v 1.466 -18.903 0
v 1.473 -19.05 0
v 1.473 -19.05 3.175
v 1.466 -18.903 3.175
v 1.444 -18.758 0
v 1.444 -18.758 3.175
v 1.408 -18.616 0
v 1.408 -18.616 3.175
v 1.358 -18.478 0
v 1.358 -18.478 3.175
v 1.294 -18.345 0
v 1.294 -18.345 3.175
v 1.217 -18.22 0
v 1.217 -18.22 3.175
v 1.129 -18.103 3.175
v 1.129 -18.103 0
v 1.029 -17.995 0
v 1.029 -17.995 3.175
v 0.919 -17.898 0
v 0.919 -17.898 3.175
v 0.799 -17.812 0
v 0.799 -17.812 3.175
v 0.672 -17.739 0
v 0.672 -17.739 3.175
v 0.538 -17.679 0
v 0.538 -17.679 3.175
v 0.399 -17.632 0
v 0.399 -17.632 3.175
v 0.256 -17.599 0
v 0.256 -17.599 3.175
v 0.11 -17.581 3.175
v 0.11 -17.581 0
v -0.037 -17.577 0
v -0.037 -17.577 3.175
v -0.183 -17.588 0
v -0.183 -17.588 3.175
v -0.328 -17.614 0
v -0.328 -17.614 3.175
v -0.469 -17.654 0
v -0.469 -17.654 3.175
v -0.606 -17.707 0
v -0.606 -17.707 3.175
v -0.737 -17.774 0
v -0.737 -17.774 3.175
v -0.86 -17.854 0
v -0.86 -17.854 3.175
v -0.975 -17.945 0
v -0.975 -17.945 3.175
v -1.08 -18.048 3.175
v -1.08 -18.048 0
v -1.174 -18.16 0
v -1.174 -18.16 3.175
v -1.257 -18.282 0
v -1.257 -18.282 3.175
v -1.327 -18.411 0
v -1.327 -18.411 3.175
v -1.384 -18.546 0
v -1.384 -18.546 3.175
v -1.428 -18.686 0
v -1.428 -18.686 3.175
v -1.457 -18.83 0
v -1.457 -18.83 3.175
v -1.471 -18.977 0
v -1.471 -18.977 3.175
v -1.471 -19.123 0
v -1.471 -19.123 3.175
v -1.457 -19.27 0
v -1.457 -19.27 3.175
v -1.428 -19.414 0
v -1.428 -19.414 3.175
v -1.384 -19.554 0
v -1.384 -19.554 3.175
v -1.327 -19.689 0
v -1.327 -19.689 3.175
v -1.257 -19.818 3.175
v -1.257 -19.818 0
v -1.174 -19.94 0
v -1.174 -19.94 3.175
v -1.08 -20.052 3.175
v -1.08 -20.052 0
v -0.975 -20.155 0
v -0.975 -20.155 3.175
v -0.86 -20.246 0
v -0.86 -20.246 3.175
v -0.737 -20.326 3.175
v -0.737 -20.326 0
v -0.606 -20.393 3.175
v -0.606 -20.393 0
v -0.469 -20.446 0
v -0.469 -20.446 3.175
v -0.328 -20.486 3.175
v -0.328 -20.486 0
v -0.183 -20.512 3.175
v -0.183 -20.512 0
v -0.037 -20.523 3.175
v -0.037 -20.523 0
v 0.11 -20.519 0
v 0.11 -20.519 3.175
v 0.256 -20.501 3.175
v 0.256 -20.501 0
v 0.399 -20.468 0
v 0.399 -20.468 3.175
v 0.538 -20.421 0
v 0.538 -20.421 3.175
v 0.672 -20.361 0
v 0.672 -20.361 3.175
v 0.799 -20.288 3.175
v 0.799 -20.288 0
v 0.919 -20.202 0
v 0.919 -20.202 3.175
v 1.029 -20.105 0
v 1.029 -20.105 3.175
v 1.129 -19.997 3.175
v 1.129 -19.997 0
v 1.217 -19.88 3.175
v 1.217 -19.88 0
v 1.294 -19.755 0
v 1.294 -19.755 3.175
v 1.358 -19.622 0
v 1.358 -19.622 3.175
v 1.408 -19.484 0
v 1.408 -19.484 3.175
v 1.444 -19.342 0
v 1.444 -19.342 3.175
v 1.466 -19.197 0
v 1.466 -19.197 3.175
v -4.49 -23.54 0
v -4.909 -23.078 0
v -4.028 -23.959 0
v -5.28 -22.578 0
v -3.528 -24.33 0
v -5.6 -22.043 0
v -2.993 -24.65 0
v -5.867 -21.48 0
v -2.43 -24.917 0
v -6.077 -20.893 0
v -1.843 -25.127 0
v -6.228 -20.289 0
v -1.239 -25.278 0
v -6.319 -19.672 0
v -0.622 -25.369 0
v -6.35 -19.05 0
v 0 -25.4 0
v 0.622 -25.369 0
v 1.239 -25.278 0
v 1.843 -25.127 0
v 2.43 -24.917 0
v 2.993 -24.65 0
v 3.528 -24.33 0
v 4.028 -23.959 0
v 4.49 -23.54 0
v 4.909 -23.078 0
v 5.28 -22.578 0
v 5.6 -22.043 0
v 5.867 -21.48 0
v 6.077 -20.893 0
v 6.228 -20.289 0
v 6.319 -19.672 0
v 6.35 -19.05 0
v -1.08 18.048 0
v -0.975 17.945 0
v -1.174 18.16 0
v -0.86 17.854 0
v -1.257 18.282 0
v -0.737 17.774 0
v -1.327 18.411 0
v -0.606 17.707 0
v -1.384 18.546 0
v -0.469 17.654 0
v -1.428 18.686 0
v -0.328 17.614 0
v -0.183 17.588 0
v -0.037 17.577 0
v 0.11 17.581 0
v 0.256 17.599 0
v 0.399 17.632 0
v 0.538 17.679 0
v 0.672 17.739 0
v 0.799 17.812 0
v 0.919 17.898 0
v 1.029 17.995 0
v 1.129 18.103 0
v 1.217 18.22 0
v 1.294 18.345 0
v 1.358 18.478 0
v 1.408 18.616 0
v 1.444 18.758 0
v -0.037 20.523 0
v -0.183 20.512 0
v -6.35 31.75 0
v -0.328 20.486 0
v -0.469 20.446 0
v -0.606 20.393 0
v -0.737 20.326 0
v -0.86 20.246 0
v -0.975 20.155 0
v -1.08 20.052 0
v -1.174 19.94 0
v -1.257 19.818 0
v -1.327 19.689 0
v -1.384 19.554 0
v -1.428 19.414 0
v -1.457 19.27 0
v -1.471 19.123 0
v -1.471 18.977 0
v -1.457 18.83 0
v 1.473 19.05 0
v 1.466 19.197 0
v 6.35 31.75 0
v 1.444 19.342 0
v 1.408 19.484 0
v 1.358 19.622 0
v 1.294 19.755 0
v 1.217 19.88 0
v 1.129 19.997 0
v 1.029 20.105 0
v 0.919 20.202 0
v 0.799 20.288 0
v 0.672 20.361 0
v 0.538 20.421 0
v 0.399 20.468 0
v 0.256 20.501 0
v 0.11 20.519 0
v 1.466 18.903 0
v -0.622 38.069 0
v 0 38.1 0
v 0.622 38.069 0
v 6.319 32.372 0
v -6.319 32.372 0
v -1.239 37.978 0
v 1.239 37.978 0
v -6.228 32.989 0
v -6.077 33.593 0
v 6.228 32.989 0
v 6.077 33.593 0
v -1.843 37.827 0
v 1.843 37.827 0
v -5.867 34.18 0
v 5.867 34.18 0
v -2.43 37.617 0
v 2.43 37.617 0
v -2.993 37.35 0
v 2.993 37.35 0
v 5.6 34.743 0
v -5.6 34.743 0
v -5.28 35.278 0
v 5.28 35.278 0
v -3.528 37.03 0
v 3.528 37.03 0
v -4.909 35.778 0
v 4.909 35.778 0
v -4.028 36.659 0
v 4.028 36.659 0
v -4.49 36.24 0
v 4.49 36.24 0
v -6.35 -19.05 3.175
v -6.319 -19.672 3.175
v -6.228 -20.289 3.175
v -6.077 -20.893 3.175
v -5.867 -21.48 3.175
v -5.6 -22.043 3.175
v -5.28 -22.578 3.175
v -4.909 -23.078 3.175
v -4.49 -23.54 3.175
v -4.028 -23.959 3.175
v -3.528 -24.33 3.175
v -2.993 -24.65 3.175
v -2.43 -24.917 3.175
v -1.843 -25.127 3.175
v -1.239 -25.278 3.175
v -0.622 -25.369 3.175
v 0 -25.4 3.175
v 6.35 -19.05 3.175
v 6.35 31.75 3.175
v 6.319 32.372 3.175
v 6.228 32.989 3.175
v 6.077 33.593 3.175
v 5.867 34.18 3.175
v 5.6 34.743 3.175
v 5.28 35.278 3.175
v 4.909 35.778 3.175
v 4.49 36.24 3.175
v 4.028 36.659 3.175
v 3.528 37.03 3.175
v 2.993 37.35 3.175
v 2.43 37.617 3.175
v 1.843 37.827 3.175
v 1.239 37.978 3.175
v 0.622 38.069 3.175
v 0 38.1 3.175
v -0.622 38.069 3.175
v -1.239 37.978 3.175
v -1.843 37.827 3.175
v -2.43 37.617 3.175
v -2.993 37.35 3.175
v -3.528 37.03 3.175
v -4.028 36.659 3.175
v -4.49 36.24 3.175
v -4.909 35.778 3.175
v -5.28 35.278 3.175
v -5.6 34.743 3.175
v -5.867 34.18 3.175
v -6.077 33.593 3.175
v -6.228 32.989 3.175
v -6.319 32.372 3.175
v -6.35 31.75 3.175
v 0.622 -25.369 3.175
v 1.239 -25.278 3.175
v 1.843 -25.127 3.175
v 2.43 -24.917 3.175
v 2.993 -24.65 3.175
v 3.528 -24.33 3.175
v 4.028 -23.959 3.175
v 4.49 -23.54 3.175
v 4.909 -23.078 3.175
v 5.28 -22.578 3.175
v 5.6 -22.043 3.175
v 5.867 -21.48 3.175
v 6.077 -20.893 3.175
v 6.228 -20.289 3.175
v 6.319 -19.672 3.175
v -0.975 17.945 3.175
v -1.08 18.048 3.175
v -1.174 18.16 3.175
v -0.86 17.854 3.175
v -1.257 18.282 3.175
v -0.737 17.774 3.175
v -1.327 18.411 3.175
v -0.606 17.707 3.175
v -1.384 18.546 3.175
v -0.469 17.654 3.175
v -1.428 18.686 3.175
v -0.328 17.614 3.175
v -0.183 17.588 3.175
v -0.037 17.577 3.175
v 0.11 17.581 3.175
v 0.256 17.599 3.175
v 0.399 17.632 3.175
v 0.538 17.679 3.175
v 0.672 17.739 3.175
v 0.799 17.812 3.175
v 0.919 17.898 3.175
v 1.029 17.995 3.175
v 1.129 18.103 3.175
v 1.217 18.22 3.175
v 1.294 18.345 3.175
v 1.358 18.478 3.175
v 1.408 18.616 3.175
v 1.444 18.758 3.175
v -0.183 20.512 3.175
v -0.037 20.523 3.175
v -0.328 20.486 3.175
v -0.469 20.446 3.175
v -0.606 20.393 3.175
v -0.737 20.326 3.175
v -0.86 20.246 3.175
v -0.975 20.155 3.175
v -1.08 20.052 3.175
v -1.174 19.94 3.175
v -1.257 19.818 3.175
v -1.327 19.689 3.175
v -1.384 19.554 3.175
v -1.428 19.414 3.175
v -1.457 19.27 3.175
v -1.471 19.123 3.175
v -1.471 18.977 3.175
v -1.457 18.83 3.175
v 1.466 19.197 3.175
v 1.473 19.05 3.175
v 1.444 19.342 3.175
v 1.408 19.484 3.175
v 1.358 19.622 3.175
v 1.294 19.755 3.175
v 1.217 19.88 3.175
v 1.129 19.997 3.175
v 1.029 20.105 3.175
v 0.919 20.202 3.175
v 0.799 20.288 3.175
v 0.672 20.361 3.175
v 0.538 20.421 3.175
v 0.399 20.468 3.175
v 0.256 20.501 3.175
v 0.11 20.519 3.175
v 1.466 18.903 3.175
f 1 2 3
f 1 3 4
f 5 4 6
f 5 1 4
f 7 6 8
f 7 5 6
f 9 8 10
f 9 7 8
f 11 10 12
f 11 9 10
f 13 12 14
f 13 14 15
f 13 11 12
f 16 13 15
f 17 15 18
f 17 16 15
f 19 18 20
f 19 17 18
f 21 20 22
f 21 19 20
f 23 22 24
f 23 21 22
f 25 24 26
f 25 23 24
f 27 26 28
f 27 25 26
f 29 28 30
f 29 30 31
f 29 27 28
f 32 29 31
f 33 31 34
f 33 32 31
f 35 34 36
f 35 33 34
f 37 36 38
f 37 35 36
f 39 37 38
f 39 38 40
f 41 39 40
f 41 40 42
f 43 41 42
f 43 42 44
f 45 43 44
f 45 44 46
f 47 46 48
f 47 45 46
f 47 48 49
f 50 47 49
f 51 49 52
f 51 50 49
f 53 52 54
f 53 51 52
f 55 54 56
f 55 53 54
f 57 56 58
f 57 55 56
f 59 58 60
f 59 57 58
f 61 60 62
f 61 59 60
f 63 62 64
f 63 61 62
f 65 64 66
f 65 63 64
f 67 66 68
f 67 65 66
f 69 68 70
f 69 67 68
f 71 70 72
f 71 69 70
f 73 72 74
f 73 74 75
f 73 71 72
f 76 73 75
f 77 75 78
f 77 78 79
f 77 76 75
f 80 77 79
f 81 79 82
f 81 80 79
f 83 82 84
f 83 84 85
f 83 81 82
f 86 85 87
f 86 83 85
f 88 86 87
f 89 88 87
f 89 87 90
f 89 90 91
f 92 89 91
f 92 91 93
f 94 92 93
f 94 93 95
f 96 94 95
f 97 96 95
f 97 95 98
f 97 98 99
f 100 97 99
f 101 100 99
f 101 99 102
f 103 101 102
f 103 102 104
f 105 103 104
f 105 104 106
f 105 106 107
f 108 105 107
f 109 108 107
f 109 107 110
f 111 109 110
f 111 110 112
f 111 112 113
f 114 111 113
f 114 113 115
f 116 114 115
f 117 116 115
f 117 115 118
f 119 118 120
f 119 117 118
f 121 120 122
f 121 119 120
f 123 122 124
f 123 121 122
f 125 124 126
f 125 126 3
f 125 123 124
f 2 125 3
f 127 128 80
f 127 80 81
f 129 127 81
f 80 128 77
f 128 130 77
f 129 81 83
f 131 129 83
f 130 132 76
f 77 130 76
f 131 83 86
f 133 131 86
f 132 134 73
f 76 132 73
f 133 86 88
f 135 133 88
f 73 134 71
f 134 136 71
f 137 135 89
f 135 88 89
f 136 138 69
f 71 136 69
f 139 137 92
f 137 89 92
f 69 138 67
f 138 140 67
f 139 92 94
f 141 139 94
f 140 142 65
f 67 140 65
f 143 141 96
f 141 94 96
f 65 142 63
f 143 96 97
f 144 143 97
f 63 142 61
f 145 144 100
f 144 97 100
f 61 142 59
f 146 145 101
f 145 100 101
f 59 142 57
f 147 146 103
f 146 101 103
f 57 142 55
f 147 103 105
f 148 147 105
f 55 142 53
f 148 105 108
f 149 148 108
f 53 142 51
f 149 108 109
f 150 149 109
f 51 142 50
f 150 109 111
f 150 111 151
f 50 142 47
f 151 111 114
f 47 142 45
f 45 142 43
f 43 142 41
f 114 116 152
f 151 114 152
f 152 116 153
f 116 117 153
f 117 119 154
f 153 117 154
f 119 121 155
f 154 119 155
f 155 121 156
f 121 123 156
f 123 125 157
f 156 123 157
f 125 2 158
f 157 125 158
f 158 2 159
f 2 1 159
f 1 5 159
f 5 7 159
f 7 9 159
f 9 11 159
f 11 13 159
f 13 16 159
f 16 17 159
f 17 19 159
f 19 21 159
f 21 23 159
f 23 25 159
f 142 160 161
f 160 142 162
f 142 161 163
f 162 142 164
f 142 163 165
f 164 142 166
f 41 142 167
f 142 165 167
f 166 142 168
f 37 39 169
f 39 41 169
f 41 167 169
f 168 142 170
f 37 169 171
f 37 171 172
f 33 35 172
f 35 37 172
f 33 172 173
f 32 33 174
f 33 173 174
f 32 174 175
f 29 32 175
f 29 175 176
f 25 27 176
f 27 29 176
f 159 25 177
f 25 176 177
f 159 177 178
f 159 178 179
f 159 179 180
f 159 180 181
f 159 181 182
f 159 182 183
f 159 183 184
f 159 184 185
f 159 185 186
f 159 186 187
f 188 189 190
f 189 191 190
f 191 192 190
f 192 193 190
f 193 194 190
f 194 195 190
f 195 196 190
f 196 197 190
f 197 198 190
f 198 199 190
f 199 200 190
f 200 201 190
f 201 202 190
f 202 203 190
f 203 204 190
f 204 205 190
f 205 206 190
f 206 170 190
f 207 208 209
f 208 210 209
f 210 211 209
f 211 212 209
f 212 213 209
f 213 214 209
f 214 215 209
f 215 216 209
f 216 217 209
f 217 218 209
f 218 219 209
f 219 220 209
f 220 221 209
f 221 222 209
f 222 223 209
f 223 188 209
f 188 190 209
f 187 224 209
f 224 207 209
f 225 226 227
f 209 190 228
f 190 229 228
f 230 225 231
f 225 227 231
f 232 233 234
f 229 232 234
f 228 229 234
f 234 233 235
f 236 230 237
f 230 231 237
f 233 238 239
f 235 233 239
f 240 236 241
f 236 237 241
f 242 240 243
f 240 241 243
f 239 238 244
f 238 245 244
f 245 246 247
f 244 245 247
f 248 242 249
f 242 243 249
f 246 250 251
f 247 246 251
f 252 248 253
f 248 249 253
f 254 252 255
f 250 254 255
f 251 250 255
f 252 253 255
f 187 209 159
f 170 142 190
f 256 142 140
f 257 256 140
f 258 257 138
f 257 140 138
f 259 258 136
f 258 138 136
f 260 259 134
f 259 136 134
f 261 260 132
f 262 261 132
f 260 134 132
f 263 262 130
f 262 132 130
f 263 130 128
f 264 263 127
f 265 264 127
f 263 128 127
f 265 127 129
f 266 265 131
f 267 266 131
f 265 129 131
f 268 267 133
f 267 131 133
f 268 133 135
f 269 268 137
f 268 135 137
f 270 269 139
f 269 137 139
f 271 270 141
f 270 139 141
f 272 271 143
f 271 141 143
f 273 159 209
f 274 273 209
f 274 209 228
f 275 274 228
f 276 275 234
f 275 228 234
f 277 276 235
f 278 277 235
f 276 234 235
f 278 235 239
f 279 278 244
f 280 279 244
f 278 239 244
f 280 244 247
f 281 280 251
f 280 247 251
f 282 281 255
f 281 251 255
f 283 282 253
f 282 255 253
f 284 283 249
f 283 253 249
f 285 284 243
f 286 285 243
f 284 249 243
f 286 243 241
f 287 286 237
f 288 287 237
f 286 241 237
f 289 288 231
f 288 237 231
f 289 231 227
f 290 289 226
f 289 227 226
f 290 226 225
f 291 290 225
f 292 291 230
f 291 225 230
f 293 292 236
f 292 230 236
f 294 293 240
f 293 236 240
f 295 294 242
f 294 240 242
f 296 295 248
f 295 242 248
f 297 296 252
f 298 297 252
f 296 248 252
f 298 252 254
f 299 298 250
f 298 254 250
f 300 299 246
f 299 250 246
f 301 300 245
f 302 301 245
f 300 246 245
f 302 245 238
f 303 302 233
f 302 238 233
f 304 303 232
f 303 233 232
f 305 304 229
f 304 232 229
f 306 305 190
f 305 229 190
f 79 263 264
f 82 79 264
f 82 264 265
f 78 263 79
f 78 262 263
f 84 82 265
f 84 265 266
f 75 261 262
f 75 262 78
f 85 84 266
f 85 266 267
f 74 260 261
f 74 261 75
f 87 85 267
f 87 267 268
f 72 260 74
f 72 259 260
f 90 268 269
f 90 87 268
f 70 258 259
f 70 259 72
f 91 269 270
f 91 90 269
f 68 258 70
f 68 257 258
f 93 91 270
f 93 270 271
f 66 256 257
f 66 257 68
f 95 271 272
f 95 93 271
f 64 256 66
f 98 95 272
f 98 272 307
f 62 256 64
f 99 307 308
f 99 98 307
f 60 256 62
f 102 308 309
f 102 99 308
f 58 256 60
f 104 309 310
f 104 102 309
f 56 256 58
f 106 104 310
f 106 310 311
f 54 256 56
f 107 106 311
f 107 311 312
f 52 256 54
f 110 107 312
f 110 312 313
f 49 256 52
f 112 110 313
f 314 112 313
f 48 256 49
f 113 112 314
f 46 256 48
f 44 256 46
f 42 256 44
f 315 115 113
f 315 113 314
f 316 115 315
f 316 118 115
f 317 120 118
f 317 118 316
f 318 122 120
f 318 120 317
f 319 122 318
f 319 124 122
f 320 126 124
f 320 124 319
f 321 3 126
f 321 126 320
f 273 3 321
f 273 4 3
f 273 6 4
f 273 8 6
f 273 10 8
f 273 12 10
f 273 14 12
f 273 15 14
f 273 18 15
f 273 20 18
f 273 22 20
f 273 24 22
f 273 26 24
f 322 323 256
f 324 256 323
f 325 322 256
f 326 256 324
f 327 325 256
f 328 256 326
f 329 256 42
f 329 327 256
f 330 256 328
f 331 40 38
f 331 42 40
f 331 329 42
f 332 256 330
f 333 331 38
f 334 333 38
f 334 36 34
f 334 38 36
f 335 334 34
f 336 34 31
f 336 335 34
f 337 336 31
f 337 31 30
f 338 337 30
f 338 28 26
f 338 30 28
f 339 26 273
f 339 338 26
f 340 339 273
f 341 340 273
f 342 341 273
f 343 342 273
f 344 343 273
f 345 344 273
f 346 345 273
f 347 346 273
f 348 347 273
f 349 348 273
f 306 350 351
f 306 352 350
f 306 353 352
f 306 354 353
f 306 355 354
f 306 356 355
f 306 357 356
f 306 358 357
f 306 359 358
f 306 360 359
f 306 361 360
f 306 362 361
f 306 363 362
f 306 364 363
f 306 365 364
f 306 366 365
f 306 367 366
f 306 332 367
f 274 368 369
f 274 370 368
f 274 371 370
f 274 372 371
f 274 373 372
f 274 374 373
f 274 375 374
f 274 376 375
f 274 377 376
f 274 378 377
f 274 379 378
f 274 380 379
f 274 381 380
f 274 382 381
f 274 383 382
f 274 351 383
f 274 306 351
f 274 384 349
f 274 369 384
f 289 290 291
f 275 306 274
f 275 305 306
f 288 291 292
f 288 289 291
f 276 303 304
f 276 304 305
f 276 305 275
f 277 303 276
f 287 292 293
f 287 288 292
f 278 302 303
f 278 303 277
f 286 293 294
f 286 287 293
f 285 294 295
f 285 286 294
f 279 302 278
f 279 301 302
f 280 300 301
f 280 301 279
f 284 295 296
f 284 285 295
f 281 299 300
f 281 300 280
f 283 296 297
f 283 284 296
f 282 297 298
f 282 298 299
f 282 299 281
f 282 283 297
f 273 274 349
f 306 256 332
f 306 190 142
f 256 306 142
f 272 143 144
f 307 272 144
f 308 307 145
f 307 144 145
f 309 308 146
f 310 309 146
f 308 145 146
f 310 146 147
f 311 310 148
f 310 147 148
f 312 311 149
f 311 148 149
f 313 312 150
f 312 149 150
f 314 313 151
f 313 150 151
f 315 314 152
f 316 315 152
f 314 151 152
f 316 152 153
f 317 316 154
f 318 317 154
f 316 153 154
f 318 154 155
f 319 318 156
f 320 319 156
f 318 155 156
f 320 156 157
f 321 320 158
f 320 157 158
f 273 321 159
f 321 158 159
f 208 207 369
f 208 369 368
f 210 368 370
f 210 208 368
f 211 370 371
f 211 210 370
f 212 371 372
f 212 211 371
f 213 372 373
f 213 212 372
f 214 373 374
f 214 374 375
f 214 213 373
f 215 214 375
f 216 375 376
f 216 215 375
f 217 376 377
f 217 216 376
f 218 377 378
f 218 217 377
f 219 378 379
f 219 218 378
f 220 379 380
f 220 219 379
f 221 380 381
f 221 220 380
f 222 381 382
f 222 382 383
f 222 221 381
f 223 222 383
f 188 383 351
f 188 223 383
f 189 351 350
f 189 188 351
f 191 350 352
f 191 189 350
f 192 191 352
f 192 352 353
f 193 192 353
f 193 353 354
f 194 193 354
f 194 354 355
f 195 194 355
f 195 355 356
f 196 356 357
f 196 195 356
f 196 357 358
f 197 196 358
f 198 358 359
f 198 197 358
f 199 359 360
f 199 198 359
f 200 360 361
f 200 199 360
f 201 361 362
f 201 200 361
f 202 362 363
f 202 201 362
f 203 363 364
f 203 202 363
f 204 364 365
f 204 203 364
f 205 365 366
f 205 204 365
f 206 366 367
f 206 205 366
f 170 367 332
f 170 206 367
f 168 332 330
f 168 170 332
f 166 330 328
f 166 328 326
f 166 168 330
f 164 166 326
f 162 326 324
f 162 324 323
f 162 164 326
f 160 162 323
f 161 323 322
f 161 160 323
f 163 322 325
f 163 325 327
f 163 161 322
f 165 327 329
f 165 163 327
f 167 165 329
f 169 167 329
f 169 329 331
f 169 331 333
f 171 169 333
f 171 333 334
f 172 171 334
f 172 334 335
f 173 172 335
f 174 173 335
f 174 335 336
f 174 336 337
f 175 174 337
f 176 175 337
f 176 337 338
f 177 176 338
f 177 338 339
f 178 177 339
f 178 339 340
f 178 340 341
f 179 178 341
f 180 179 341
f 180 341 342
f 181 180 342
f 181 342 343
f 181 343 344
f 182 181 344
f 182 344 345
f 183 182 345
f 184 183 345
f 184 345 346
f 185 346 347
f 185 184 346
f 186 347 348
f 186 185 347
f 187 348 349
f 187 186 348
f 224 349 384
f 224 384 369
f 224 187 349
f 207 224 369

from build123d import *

# Parameters (mm, degrees)
F0_R     = 1.4732
F1_DEPTH = 3.175


# Not quite as in the source:
# - a length typed as a fraction of an inch, garbled in the dataset ("3 / 203.2 mm" for 3/8 in), is restored


with BuildPart() as f1:
    # F0 (on Top) → F1 (new body)
    with BuildSketch(Plane.XY):
        with BuildLine():
            Line((6.35, -19.05), (6.35, 25.4))
            Line((6.35, 25.4), (6.35, 31.75))
            ThreePointArc((6.35, 31.75), (4.4901280605, 36.2401280605), (0, 38.1))
            ThreePointArc((0, 38.1), (-4.4901280605, 36.2401280605), (-6.35, 31.75))
            Line((-6.35, 31.75), (-6.35, 25.4))
            Line((-6.35, 25.4), (-6.35, -19.05))
            ThreePointArc((-6.35, -19.05), (-4.4901280605, -23.5401280605), (0, -25.4))
            ThreePointArc((0, -25.4), (4.4901280605, -23.5401280605), (6.35, -19.05))
        make_face()
        with Locations((0, -19.05)):
            Circle(F0_R, mode=Mode.SUBTRACT)
        with Locations((0, 19.05)):
            Circle(F0_R, mode=Mode.SUBTRACT)
    extrude(amount=F1_DEPTH)


solid = f1.part
